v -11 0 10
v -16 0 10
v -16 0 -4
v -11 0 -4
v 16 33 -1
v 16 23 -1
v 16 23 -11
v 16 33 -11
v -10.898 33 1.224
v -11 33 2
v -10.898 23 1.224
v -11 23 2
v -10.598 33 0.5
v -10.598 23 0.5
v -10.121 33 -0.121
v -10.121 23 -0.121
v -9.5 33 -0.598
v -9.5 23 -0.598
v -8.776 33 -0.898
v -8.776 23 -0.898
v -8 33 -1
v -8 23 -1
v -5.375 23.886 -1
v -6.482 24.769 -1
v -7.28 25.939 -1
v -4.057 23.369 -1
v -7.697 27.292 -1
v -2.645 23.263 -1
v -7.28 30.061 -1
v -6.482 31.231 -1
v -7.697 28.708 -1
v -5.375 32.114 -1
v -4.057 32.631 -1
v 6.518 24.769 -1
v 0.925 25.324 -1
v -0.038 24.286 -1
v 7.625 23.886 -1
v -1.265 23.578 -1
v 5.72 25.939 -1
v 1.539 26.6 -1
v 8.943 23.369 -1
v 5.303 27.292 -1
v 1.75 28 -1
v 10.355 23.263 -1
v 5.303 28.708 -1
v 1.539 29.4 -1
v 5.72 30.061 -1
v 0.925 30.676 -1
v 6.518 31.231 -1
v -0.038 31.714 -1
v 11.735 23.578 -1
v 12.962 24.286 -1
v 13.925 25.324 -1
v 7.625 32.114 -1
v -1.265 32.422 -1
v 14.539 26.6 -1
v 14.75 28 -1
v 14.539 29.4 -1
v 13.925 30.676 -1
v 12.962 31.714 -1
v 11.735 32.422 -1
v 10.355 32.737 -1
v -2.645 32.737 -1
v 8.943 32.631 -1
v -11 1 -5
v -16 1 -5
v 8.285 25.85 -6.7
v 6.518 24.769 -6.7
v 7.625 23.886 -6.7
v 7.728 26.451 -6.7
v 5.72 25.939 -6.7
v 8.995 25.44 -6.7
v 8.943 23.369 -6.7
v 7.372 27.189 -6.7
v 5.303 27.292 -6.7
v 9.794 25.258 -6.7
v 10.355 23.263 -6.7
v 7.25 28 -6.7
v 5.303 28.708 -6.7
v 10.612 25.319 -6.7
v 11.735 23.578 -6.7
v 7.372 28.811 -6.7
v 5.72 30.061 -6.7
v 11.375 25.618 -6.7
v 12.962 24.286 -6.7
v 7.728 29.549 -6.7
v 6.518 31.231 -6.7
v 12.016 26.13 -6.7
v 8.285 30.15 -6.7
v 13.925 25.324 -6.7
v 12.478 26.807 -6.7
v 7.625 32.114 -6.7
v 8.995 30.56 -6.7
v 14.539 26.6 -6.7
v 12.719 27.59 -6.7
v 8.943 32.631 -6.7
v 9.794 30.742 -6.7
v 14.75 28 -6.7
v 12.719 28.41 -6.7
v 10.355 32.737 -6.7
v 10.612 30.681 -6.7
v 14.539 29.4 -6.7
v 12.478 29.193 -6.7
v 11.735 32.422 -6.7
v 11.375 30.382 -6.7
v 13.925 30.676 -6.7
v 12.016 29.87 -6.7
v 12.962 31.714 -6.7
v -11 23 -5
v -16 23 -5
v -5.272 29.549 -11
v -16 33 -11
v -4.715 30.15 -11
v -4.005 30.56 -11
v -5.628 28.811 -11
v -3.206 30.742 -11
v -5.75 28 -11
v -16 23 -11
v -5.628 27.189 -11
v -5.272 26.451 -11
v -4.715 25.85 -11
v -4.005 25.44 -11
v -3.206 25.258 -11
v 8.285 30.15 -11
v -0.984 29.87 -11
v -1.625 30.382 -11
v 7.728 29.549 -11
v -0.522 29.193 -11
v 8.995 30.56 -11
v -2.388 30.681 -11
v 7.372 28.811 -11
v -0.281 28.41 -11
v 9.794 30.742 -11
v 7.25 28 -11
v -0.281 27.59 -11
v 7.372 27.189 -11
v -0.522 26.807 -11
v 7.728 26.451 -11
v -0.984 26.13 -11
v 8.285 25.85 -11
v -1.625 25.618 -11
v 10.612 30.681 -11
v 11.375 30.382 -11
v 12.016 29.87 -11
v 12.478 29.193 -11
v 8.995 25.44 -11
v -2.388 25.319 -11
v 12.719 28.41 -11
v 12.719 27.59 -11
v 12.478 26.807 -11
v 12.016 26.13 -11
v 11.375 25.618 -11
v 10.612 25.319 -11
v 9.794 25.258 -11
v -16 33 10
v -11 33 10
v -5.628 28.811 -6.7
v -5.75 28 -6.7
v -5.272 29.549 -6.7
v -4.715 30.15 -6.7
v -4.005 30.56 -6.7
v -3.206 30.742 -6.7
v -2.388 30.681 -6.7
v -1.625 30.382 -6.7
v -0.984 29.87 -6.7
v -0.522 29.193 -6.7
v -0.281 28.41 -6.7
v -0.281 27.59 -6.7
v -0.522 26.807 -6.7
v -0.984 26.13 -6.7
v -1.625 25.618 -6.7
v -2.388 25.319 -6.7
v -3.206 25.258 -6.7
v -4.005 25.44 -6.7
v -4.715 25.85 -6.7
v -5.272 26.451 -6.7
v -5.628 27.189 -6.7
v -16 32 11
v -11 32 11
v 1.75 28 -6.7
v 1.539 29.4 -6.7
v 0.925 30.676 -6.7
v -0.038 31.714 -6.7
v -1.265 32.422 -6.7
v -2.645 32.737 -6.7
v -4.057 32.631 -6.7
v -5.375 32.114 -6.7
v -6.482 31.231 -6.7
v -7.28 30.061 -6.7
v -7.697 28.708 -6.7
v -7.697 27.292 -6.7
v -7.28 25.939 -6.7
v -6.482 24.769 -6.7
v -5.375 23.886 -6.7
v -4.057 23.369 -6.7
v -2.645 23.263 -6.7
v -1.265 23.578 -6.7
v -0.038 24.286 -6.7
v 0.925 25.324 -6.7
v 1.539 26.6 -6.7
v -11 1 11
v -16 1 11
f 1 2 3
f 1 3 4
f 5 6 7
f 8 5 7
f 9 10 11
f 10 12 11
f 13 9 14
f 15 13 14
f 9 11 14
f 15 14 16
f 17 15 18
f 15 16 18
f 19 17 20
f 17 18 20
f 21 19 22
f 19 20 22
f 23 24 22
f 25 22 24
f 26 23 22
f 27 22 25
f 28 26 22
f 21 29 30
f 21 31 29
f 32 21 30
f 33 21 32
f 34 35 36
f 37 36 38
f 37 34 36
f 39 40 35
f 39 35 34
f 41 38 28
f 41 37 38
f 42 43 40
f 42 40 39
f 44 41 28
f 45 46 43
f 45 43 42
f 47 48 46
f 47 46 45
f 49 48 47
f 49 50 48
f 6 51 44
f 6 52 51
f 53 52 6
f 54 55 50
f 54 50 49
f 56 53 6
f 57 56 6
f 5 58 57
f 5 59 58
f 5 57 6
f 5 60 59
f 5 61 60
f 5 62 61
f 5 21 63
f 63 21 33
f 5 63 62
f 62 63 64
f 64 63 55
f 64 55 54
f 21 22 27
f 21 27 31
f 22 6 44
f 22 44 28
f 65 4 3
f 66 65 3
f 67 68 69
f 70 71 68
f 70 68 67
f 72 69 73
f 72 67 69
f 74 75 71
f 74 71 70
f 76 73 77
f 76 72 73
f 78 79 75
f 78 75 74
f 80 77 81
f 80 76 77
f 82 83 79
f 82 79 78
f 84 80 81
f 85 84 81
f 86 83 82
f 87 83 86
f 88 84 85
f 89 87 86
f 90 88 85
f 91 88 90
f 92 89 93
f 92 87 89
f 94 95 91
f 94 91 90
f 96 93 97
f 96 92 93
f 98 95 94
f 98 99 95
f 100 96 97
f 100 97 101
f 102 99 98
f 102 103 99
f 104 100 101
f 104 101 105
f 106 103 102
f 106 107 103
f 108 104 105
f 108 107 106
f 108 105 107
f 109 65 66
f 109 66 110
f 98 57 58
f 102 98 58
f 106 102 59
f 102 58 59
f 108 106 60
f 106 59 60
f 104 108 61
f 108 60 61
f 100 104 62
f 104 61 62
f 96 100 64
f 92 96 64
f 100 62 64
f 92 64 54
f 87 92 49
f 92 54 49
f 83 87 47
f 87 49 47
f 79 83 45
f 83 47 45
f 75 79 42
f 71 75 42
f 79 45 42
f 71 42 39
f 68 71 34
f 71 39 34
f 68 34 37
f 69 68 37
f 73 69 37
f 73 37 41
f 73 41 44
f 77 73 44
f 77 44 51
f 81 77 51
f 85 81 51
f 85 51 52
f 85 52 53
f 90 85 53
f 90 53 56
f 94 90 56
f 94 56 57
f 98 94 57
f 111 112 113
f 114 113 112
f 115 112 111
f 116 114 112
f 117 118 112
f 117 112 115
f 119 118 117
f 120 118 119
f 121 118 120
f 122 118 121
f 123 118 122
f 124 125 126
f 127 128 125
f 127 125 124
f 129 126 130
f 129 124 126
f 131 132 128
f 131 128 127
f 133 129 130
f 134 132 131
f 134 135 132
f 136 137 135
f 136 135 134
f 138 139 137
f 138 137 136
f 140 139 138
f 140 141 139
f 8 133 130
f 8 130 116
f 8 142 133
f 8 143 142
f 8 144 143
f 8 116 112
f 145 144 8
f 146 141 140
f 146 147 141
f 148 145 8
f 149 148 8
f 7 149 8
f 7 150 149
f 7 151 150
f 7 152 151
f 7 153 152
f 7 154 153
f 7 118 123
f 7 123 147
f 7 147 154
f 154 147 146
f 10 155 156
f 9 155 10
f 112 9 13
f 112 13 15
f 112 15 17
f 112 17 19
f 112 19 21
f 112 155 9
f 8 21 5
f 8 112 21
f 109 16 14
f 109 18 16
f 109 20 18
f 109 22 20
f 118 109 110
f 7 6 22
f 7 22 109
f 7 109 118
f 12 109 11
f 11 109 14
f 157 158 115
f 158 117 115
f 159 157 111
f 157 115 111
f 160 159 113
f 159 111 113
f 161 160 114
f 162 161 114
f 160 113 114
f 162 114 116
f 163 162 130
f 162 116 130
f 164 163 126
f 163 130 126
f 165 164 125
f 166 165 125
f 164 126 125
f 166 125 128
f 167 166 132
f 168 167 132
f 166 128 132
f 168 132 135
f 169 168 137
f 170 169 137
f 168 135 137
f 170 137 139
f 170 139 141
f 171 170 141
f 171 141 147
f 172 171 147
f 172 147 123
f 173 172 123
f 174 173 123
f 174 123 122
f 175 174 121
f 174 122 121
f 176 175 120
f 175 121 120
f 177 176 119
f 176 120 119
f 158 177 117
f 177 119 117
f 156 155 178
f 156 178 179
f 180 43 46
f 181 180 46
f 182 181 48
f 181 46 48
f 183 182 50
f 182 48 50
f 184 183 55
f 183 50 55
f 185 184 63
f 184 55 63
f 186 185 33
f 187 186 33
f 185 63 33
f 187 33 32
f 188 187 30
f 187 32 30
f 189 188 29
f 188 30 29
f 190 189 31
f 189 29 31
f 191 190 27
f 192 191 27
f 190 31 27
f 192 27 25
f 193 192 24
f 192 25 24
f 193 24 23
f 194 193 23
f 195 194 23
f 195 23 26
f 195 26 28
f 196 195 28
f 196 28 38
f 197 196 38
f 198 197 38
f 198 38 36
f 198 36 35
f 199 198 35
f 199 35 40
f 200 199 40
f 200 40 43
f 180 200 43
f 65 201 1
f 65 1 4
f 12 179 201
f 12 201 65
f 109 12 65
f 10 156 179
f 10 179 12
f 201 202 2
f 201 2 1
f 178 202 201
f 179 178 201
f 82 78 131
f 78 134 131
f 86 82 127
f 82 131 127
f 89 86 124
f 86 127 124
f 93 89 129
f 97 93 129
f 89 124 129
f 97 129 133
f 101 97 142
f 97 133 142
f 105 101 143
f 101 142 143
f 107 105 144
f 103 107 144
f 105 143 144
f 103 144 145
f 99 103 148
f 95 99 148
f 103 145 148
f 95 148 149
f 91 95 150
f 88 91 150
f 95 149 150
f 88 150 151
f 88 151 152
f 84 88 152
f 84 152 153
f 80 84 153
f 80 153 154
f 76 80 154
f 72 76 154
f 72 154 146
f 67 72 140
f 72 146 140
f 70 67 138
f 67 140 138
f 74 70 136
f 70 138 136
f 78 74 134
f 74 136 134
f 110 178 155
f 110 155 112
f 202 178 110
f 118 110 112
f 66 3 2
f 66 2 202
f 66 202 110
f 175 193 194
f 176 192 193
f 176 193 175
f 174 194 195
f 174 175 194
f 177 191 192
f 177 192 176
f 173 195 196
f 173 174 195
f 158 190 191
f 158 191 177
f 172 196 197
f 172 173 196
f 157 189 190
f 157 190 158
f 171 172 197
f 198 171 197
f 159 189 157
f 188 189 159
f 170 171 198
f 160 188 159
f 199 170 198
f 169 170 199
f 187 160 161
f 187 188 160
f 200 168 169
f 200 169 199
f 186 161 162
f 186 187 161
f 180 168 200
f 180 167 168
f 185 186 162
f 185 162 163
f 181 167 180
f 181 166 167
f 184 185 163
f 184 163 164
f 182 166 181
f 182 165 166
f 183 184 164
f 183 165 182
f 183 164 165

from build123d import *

# Parameters (mm, degrees)
SKETCH_1_W                = 32
SKETCH_1_H                = 22
EXTRUDE_1_DEPTH           = 33
SKETCH_2_W                = 27
SKETCH_2_H                = 12
CUT_EXTRUDE_1_DEPTH       = 39.288379438
SKETCH_4_W                = 10
SKETCH_4_H                = 23
CUT_EXTRUDE_2_DEPTH       = 27
HOLE_WIZARD_1_D           = 5.5
HOLE_WIZARD_1_CBORE_D     = 9.5
HOLE_WIZARD_1_CBORE_DEPTH = 5.7
SKETCH_8_W                = 6
SKETCH_8_H                = 23
CUT_EXTRUDE_3_DEPTH       = 45.034077713
FILLET_1_R                = 3
CHAMFER_1_SIZE            = 1


with BuildPart() as part:
    # 草图1 → 凸台-拉伸1 (new body)
    with BuildSketch(Plane(origin=(0, 0, 0), x_dir=(1, 0, 0), z_dir=(0, 1, 0))):
        Rectangle(SKETCH_1_W, SKETCH_1_H)
    extrude(amount=EXTRUDE_1_DEPTH)

    # 草图2 → 切除-拉伸1 (cut, through all)
    with BuildSketch(Plane(origin=(0, 33, 0), x_dir=(1, 0, 0), z_dir=(0, 1, 0))):
        with Locations((2.5, -5)):
            Rectangle(SKETCH_2_W, SKETCH_2_H)
    extrude(amount=-CUT_EXTRUDE_1_DEPTH, mode=Mode.SUBTRACT)

    # 草图4 → 切除-拉伸2 (cut)
    with BuildSketch(Plane(origin=(16, 0, -21), x_dir=(0, 0, 1), z_dir=(-1, 0, 0))):
        with Locations((15, 11.5)):
            Rectangle(SKETCH_4_W, SKETCH_4_H)
    extrude(amount=CUT_EXTRUDE_2_DEPTH, mode=Mode.SUBTRACT)

    # 打孔尺寸根据内六角圆柱头螺钉的类型1 (through all)
    with Locations(Plane.XY.offset(-1)):
        with Locations((-3, 28), (10, 28)):
            CounterBoreHole(HOLE_WIZARD_1_D / 2, HOLE_WIZARD_1_CBORE_D / 2, HOLE_WIZARD_1_CBORE_DEPTH)

    # 草图8 → 切除-拉伸3 (cut, through all)
    with BuildSketch(Plane(origin=(-11, 0, 0), x_dir=(0, 0, -1), z_dir=(1, 0, 0))):
        with Locations((8, 11.5)):
            Rectangle(SKETCH_8_W, SKETCH_8_H)
    extrude(amount=-CUT_EXTRUDE_3_DEPTH, mode=Mode.SUBTRACT)

    # 圆角1
    fillet_1_edges = [part.edges().sort_by_distance(p)[0] for p in [
        (-11, 28, -1),
    ]]
    fillet(fillet_1_edges, radius=FILLET_1_R)

    # 倒角1
    chamfer_1_edges = [part.edges().sort_by_distance(p)[0] for p in [
        (-13.5, 33, 11),
        (-13.5, 0, 11),
        (-13.5, 0, -5),
    ]]
    chamfer(chamfer_1_edges, length=CHAMFER_1_SIZE)


solid = part.part
